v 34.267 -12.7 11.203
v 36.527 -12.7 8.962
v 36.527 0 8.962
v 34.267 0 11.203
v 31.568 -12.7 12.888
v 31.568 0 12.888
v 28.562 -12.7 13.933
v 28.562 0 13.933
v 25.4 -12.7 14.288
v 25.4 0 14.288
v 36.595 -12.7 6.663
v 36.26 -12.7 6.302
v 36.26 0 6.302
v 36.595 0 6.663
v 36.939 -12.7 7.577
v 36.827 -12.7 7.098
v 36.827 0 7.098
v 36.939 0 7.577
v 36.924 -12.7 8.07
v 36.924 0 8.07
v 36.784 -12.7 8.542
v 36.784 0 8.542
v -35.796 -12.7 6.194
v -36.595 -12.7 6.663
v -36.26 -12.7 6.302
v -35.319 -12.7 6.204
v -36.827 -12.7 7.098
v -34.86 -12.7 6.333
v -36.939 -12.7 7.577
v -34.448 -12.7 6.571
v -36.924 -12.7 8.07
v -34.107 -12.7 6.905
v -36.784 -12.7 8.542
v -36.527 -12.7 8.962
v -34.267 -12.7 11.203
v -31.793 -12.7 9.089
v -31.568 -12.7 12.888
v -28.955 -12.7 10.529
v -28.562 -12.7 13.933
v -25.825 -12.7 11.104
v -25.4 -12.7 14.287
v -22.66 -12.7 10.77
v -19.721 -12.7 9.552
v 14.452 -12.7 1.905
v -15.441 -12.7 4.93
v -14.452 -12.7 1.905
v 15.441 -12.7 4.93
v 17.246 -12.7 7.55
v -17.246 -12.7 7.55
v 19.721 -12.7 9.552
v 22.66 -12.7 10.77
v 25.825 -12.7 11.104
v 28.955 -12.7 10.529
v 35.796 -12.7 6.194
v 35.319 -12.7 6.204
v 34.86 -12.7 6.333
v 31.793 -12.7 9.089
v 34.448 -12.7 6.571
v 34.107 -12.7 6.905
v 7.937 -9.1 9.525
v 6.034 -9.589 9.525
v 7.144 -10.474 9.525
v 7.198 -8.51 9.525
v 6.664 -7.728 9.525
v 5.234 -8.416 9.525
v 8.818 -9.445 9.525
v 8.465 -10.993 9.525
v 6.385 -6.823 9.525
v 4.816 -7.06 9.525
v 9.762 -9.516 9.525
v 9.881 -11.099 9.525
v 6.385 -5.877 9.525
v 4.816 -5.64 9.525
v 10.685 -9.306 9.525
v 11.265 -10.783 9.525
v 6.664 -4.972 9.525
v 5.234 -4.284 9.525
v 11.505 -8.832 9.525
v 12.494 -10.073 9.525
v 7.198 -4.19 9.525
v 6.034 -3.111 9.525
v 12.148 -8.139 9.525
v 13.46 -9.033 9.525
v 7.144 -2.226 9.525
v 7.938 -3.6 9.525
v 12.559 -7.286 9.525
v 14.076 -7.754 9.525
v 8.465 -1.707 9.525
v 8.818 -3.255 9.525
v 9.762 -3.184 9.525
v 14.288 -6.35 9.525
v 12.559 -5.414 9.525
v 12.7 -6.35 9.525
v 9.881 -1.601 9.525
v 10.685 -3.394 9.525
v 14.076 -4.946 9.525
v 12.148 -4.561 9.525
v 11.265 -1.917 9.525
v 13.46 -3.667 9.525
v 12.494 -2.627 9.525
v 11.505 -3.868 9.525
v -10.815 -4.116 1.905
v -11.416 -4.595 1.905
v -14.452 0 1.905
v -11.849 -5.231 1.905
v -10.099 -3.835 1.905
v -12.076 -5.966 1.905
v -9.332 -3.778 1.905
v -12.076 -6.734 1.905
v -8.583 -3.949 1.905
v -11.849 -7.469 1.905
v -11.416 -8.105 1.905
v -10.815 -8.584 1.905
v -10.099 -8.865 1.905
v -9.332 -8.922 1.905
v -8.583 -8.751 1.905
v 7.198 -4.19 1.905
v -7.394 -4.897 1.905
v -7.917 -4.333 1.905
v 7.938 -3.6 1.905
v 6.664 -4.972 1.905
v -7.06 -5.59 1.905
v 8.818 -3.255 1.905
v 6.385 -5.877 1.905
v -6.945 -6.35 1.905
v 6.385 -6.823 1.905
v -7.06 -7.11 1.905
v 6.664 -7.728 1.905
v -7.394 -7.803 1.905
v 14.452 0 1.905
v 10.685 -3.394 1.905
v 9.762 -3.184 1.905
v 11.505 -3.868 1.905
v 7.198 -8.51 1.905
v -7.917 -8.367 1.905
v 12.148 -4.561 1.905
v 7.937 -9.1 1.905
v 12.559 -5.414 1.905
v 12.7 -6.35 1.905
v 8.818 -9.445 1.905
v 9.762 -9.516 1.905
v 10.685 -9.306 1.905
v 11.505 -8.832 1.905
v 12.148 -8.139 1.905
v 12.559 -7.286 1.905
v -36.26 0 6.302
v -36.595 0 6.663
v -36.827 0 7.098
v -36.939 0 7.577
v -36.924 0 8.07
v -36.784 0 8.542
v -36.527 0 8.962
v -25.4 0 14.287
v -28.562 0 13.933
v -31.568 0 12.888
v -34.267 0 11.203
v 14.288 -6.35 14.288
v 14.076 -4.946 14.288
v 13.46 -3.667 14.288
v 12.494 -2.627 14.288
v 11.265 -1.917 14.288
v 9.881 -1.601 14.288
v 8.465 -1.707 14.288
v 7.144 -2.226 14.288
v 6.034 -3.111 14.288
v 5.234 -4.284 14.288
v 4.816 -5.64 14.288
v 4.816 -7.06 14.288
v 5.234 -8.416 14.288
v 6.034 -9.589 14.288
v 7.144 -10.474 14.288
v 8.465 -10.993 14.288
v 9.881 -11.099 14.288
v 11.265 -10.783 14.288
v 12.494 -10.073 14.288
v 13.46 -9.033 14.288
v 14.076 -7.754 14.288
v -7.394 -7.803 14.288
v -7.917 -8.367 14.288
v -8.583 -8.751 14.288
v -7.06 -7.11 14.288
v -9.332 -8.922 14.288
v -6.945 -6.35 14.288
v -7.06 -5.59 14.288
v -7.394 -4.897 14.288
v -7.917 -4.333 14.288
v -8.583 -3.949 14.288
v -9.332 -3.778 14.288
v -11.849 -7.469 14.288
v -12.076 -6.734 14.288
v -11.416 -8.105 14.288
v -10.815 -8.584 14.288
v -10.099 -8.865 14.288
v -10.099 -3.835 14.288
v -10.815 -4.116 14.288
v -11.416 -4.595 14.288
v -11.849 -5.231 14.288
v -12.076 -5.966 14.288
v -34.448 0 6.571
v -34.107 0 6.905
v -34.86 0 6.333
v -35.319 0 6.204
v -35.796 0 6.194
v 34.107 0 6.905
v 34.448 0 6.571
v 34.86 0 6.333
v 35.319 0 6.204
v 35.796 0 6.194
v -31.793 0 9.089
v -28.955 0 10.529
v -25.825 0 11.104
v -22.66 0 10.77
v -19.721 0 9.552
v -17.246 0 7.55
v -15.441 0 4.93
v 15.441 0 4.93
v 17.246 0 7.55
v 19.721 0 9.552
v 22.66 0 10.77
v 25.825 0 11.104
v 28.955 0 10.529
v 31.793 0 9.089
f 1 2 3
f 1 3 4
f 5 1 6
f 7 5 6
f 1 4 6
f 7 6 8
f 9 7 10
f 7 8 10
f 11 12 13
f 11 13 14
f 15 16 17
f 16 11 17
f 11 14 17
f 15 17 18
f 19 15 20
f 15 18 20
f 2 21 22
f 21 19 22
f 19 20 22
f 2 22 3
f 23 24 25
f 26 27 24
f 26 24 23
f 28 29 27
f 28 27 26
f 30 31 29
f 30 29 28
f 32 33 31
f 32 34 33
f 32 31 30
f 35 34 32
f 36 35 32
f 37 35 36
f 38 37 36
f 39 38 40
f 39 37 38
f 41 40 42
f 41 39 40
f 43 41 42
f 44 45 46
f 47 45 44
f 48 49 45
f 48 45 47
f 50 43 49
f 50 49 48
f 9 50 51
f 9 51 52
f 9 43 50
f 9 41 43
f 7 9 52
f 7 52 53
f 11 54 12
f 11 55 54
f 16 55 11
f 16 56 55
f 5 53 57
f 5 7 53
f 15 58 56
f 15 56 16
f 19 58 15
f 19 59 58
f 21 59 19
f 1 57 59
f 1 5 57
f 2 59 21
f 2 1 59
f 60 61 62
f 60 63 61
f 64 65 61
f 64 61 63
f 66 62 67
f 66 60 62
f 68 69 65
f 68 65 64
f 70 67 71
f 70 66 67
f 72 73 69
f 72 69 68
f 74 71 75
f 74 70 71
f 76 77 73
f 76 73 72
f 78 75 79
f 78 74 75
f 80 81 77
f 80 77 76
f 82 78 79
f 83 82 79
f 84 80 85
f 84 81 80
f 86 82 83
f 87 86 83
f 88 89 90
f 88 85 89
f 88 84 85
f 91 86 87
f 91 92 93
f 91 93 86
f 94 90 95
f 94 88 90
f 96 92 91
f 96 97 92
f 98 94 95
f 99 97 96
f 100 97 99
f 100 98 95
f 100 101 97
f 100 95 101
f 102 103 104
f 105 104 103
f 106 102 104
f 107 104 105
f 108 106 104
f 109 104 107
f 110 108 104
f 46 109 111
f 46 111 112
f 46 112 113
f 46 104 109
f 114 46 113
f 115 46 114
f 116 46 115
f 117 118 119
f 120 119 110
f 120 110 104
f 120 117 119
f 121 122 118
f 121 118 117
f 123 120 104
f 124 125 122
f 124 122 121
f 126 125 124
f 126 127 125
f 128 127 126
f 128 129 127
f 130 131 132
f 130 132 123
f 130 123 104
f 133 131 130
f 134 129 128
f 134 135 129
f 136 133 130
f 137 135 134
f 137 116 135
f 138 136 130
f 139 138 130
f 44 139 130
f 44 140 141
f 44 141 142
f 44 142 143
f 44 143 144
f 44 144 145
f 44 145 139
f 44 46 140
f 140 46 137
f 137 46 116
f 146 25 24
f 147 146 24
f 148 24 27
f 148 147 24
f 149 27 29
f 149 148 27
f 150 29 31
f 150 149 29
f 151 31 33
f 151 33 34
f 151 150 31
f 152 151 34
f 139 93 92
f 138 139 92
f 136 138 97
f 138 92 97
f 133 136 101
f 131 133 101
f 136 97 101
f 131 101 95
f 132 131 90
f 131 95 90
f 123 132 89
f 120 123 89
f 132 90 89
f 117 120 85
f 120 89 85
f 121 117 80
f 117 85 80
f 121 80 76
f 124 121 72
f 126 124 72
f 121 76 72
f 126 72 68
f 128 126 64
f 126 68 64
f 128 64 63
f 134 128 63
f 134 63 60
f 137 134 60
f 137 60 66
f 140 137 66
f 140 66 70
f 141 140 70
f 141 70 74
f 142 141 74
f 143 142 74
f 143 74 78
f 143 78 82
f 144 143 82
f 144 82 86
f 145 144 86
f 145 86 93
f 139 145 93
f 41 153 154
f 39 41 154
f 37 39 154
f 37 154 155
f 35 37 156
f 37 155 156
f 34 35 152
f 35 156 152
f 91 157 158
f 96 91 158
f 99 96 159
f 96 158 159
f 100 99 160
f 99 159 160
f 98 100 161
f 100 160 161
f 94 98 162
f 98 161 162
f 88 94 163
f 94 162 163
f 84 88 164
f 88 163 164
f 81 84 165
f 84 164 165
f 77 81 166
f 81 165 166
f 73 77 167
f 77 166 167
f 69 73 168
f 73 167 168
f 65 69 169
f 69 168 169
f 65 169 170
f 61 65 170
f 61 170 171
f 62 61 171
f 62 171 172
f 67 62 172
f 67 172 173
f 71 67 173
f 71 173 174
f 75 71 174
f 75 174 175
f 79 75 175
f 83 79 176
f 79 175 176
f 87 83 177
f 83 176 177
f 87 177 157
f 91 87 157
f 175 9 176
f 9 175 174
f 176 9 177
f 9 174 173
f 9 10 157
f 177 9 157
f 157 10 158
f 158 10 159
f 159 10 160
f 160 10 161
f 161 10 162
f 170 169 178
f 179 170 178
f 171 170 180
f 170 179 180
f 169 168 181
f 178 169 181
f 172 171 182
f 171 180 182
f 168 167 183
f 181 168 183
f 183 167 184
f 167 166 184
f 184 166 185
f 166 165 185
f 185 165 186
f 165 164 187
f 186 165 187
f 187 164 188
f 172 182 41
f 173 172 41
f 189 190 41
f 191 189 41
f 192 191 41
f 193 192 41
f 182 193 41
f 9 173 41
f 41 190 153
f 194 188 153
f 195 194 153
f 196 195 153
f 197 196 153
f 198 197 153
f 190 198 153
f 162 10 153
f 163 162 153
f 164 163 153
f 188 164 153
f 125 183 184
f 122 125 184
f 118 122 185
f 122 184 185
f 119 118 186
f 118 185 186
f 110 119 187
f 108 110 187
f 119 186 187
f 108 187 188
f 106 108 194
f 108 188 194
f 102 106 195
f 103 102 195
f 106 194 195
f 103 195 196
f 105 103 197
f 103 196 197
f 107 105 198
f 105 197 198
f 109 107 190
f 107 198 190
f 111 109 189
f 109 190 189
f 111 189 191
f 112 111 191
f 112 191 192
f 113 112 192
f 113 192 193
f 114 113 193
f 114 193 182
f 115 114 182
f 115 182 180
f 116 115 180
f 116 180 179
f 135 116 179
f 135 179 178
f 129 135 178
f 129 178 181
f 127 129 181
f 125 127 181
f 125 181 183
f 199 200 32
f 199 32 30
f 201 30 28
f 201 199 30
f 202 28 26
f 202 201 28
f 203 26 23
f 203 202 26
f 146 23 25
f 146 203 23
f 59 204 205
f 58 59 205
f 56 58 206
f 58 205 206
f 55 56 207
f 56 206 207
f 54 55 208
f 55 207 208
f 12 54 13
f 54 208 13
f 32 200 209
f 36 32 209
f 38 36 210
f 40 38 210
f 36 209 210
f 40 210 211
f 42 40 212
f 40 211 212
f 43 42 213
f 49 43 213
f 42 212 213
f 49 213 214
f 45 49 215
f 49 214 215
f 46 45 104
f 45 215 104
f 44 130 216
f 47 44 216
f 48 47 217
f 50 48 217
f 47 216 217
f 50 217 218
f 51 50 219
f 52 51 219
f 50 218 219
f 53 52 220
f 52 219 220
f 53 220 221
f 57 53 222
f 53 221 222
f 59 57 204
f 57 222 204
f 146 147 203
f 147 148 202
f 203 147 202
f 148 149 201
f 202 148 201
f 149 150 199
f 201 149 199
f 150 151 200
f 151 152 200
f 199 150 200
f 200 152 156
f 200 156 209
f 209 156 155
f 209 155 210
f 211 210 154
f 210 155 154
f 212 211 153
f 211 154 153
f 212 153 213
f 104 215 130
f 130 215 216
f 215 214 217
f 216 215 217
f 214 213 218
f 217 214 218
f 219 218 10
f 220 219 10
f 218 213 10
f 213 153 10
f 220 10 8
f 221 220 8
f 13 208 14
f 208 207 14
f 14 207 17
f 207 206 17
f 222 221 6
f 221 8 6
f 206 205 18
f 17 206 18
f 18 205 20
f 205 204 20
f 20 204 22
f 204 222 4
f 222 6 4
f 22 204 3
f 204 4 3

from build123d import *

# Parameters (mm, degrees)
F1_DEPTH    = 12.7
F2_R        = 3.175
F2_R_2      = 2.5796875
F3_DEPTH    = 14.2885
F2_R_3      = 4.7625
F4_DEPTH    = 4.7625
F7_T1_DEPTH = 23.7232420224
F7_T3_DEPTH = 21.5242768354
F8_W        = 32.2767272592
F8_H        = 15.9856376707
F9_DEPTH    = 1.905


# Not quite as in the source:
# - a fillet or chamfer that OpenCascade refuses, or shapes differently, is made with other operations: its cross-section is extruded or revolved along the edge and cut away or added


with BuildPart() as f1:
    # F0 (on Front) → F1 (new body)
    with BuildSketch(Plane.XZ):
        with BuildLine():
            ThreePointArc((-35.0237072996, 5.55625), (-22.5238733613, 10.7338507446), (-14.2875, 0))
            Line((-14.2875, 0), (0, 0))
            Line((0, 0), (14.2875, 0))
            ThreePointArc((14.2875, 0), (22.5238733613, 10.7338507446), (35.0237072996, 5.55625))
            Line((35.0237072996, 5.55625), (37.7733379566, 7.14375))
            ThreePointArc((37.7733379566, 7.14375), (32.54375, 12.3733379566), (25.4, 14.2875))
            Line((25.4, 14.2875), (0, 14.2875))
            Line((0, 14.2875), (-25.4, 14.2875))
            ThreePointArc((-25.4, 14.2875), (-32.54375, 12.3733379566), (-37.7733379566, 7.14375))
            Line((-37.7733379566, 7.14375), (-35.0237072996, 5.55625))
        make_face()
    extrude(amount=F1_DEPTH)

    # F2 (on face) → F3 (cut, through all)
    with BuildSketch(Plane.XY.offset(14.2875)):
        with Locations((9.525, -6.35)):
            Circle(F2_R)
        with Locations((-9.525, -6.35)):
            Circle(F2_R_2)
    extrude(amount=-F3_DEPTH, mode=Mode.SUBTRACT)

    # F2 (on face) → F4 (cut)
    with BuildSketch(Plane.XY.offset(14.2875)):
        with Locations((9.525, -6.35)):
            Circle(F2_R_3)
        with Locations((9.525, -6.35)):
            Circle(F2_R, mode=Mode.SUBTRACT)
    extrude(amount=-F4_DEPTH, mode=Mode.SUBTRACT)

    # F7: fillet of radius 1.905 on 4 edges, made by hand

    # F7_s2 → F7_t1 (cut)
    with BuildSketch(Plane.XZ.offset(-5.5116210112)):
        with BuildLine():
            ThreePointArc((-35.9958935884, 6.1175420156), (-36.9160377964, 7.4177082385), (-36.526992602, 8.9622927805))
            ThreePointArc((-36.526992602, 8.9622927805), (-37.1852941649, 8.0770971084), (-37.7733379566, 7.14375))
            Line((-37.7733379566, 7.14375), (-35.9958935884, 6.1175420156))
        make_face()
        with BuildLine():
            ThreePointArc((35.9958935884, 6.1175420156), (36.9160377964, 7.4177082385), (36.526992602, 8.9622927805))
            ThreePointArc((36.526992602, 8.9622927805), (37.1852941649, 8.0770971084), (37.7733379566, 7.14375))
            Line((37.7733379566, 7.14375), (35.9958935884, 6.1175420156))
        make_face()
    extrude(amount=F7_T1_DEPTH, mode=Mode.SUBTRACT)

    # F7_s4 → F7_t3 (cut)
    with BuildSketch(Plane.XZ.offset(-4.4121384177)):
        with BuildLine():
            ThreePointArc((-34.1069900207, 6.9047795786), (-35.242899906, 6.2171522544), (-36.5521168814, 6.4386776835))
            Line((-36.5521168814, 6.4386776835), (-35.0237072996, 5.55625))
            ThreePointArc((-35.0237072996, 5.55625), (-34.5901169235, 6.2473520136), (-34.1069900207, 6.9047795786))
        make_face()
        with BuildLine():
            ThreePointArc((34.1069900207, 6.9047795786), (35.242899906, 6.2171522544), (36.5521168814, 6.4386776835))
            Line((36.5521168814, 6.4386776835), (35.0237072996, 5.55625))
            ThreePointArc((35.0237072996, 5.55625), (34.5901169235, 6.2473520136), (34.1069900207, 6.9047795786))
        make_face()
    extrude(amount=F7_T3_DEPTH, mode=Mode.SUBTRACT)

    # F8 (on face) → F9 (cut)
    with BuildSketch(Plane(origin=(0, 0, 0), x_dir=(1, 0, 0), z_dir=(0, 0, -1))):
        with Locations((0, 6.0593477681)):
            Rectangle(F8_W, F8_H)
    extrude(amount=-F9_DEPTH, mode=Mode.SUBTRACT)


solid = f1.part
